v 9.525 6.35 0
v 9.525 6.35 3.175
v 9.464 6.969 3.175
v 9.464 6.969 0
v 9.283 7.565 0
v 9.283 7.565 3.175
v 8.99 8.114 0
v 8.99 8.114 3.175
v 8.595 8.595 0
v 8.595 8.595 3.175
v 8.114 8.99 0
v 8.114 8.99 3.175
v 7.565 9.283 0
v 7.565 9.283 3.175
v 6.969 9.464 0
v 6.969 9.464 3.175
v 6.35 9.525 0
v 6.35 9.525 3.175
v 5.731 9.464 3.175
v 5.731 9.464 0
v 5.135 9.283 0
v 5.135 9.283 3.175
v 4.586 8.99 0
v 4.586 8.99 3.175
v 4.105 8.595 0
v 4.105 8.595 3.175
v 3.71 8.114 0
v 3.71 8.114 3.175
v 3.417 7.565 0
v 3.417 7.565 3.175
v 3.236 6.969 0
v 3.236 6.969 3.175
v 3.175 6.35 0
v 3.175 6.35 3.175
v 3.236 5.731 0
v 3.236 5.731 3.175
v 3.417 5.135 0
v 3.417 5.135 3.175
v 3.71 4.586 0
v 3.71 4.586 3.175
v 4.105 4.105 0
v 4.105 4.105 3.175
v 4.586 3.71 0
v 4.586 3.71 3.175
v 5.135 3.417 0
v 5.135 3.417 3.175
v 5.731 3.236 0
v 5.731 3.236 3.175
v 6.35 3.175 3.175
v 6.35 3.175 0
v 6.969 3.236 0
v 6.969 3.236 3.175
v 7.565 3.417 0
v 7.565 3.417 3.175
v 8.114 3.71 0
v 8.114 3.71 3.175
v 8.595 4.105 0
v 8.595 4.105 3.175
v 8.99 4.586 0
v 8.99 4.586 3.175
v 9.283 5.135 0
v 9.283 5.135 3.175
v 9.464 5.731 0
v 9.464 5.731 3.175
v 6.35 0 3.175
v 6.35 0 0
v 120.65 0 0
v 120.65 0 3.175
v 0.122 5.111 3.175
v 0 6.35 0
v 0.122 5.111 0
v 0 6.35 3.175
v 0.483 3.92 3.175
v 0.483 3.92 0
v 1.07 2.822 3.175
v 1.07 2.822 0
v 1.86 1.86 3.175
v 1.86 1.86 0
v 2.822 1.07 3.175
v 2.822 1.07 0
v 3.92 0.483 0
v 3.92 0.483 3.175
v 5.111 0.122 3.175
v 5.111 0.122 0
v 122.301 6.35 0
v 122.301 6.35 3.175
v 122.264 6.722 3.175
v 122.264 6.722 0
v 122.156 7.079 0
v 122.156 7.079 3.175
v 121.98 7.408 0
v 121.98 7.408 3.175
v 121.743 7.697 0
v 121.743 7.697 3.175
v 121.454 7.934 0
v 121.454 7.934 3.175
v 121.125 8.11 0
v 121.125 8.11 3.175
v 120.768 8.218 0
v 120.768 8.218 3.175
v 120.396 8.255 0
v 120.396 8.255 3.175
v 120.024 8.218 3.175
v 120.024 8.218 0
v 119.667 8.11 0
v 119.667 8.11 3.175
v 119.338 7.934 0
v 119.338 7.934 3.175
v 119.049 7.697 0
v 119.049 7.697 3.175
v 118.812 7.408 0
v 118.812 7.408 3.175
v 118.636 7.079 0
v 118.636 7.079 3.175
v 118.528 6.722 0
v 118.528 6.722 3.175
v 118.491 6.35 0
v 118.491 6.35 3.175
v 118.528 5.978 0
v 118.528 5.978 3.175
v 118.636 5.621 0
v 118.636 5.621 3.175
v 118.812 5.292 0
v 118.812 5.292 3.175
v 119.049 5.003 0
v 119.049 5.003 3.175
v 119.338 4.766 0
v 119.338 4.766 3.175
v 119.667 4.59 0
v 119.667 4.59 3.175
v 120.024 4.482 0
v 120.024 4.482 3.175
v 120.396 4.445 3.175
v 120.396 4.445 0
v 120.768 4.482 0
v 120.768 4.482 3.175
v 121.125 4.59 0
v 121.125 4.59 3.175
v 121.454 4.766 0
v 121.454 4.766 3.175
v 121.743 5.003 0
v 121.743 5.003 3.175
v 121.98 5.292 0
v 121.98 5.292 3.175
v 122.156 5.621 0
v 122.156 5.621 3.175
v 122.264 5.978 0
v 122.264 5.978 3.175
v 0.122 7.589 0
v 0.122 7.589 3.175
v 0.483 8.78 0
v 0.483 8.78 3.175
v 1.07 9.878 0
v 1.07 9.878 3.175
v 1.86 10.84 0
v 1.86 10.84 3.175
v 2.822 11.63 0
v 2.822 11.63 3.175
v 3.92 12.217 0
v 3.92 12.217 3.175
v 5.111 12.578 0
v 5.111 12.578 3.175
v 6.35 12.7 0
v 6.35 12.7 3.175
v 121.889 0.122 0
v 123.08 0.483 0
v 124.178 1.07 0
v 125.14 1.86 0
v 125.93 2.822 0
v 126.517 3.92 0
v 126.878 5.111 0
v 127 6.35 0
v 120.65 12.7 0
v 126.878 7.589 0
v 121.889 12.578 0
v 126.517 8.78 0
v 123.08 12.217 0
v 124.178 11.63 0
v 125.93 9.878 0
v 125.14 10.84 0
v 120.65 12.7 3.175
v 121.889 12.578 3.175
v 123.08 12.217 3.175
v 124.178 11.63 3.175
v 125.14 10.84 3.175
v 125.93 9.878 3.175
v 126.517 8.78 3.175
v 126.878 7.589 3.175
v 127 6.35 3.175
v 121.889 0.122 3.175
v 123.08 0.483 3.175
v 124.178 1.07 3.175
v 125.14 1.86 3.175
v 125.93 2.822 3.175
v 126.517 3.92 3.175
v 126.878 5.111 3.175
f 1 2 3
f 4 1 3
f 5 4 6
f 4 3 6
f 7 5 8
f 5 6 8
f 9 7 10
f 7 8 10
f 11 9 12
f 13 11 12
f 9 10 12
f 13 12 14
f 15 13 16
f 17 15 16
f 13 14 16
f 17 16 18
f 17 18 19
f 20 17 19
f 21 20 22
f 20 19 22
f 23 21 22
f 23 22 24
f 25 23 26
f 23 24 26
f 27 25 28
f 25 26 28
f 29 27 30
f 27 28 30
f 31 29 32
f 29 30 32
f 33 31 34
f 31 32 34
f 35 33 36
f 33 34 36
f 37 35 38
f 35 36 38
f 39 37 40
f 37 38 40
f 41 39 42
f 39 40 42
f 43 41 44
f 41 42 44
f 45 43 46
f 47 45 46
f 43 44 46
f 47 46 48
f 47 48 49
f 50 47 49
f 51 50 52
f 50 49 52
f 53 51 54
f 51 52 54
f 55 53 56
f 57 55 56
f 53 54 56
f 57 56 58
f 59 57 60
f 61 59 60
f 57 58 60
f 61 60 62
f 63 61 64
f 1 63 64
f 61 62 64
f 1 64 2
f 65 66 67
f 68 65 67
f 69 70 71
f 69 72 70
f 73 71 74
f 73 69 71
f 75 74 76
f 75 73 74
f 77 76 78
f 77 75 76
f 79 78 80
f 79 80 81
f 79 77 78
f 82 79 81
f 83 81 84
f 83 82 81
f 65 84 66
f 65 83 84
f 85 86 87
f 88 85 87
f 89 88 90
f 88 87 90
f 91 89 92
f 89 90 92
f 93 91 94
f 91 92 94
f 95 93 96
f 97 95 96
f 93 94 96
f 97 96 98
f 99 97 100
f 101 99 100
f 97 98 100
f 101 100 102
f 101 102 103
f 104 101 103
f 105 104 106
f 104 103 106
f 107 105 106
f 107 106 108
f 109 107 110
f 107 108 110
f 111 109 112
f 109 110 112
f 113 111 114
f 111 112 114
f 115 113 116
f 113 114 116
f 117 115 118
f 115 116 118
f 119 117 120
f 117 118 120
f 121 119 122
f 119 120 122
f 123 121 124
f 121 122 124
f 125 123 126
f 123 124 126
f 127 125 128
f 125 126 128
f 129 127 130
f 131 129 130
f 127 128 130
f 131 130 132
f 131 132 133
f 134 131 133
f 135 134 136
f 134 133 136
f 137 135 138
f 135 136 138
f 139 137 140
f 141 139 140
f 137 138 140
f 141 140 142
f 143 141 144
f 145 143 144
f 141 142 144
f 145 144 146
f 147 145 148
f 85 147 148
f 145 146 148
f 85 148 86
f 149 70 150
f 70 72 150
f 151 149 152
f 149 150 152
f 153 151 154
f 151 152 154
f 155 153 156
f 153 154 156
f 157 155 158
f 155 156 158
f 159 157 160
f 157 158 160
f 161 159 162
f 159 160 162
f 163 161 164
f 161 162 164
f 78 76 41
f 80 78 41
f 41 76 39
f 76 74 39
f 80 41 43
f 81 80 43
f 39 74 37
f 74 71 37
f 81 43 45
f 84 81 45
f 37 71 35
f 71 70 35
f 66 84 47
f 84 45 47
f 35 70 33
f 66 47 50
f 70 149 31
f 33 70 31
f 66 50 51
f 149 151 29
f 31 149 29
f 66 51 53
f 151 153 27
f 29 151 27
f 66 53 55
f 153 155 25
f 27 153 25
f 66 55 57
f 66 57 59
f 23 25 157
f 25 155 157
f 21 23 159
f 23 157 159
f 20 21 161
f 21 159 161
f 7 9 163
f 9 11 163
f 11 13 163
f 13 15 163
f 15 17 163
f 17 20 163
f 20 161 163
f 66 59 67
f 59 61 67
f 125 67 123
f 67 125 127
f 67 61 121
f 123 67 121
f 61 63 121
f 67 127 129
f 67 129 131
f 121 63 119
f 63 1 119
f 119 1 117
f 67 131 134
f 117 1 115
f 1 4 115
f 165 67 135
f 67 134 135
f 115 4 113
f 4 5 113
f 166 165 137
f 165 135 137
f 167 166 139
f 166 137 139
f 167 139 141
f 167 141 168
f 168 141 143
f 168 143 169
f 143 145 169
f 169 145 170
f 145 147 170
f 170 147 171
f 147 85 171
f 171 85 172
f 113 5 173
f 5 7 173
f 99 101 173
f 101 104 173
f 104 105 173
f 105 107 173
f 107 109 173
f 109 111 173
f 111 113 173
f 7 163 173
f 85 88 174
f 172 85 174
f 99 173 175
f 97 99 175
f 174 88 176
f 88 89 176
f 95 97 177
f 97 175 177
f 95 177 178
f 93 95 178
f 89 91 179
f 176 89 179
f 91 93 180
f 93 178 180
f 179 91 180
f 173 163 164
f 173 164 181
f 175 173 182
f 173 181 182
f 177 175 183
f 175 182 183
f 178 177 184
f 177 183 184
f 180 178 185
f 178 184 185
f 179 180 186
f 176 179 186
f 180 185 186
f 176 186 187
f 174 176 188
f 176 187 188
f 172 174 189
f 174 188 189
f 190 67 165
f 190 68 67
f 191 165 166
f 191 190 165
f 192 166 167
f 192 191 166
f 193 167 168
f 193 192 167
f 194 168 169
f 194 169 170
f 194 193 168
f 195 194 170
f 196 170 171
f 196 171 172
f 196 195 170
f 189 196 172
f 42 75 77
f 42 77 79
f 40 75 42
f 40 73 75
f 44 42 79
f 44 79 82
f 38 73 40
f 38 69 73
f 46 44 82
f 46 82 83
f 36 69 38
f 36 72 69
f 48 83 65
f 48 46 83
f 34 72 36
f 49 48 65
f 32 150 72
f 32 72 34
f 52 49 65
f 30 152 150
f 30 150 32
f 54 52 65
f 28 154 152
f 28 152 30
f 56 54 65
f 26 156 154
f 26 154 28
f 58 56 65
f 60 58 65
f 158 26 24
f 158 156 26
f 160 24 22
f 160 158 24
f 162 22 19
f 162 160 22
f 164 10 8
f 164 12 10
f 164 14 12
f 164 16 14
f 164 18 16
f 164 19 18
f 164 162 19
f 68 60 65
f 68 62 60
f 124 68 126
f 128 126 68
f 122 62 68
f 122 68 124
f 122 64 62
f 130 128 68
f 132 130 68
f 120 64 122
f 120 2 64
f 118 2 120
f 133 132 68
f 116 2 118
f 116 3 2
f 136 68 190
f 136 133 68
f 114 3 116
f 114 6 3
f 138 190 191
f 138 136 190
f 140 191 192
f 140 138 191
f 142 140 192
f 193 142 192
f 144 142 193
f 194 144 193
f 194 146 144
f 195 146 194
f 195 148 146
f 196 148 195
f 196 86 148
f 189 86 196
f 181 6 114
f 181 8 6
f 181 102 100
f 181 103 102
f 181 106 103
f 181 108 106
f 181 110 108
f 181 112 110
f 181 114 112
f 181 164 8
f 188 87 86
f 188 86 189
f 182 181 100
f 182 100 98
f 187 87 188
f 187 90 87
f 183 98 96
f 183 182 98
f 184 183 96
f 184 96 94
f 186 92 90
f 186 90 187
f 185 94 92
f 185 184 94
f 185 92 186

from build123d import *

# Parameters (mm, degrees)
SKETCH1_W           = 127
SKETCH1_H           = 12.7
BOSS_EXTRUDE1_DEPTH = 3.175
FILLET1_R           = 6.35
SKETCH2_R           = 3.175
SKETCH2_R_2         = 1.905
CUT_EXTRUDE1_DEPTH  = 3.175
FILLET2_R           = 6.35


with BuildPart() as part:
    # Sketch1 → Boss-Extrude1 (new body)
    with BuildSketch(Plane.XY):
        with Locations((63.5, 6.35)):
            Rectangle(SKETCH1_W, SKETCH1_H)
    extrude(amount=BOSS_EXTRUDE1_DEPTH)

    # Fillet1
    fillet1_edges = [part.edges().sort_by_distance(p)[0] for p in [
        (0, 0, 1.5875),
        (0, 12.7, 1.5875),
    ]]
    fillet(fillet1_edges, radius=FILLET1_R - 0.0001)  # a hair under: the kernel refuses the full size

    # Sketch2 → Cut-Extrude1 (cut)
    with BuildSketch(Plane.XY.offset(3.175)):
        with Locations((6.35, 6.35)):
            Circle(SKETCH2_R)
        with Locations((120.396, 6.35)):
            Circle(SKETCH2_R_2)
    extrude(amount=-CUT_EXTRUDE1_DEPTH, mode=Mode.SUBTRACT)

    # Fillet2
    fillet2_edges = [part.edges().sort_by_distance(p)[0] for p in [
        (127, 0, 1.5875),
        (127, 12.7, 1.5875),
    ]]
    fillet(fillet2_edges, radius=FILLET2_R - 0.0001)  # a hair under: the kernel refuses the full size


solid = part.part
